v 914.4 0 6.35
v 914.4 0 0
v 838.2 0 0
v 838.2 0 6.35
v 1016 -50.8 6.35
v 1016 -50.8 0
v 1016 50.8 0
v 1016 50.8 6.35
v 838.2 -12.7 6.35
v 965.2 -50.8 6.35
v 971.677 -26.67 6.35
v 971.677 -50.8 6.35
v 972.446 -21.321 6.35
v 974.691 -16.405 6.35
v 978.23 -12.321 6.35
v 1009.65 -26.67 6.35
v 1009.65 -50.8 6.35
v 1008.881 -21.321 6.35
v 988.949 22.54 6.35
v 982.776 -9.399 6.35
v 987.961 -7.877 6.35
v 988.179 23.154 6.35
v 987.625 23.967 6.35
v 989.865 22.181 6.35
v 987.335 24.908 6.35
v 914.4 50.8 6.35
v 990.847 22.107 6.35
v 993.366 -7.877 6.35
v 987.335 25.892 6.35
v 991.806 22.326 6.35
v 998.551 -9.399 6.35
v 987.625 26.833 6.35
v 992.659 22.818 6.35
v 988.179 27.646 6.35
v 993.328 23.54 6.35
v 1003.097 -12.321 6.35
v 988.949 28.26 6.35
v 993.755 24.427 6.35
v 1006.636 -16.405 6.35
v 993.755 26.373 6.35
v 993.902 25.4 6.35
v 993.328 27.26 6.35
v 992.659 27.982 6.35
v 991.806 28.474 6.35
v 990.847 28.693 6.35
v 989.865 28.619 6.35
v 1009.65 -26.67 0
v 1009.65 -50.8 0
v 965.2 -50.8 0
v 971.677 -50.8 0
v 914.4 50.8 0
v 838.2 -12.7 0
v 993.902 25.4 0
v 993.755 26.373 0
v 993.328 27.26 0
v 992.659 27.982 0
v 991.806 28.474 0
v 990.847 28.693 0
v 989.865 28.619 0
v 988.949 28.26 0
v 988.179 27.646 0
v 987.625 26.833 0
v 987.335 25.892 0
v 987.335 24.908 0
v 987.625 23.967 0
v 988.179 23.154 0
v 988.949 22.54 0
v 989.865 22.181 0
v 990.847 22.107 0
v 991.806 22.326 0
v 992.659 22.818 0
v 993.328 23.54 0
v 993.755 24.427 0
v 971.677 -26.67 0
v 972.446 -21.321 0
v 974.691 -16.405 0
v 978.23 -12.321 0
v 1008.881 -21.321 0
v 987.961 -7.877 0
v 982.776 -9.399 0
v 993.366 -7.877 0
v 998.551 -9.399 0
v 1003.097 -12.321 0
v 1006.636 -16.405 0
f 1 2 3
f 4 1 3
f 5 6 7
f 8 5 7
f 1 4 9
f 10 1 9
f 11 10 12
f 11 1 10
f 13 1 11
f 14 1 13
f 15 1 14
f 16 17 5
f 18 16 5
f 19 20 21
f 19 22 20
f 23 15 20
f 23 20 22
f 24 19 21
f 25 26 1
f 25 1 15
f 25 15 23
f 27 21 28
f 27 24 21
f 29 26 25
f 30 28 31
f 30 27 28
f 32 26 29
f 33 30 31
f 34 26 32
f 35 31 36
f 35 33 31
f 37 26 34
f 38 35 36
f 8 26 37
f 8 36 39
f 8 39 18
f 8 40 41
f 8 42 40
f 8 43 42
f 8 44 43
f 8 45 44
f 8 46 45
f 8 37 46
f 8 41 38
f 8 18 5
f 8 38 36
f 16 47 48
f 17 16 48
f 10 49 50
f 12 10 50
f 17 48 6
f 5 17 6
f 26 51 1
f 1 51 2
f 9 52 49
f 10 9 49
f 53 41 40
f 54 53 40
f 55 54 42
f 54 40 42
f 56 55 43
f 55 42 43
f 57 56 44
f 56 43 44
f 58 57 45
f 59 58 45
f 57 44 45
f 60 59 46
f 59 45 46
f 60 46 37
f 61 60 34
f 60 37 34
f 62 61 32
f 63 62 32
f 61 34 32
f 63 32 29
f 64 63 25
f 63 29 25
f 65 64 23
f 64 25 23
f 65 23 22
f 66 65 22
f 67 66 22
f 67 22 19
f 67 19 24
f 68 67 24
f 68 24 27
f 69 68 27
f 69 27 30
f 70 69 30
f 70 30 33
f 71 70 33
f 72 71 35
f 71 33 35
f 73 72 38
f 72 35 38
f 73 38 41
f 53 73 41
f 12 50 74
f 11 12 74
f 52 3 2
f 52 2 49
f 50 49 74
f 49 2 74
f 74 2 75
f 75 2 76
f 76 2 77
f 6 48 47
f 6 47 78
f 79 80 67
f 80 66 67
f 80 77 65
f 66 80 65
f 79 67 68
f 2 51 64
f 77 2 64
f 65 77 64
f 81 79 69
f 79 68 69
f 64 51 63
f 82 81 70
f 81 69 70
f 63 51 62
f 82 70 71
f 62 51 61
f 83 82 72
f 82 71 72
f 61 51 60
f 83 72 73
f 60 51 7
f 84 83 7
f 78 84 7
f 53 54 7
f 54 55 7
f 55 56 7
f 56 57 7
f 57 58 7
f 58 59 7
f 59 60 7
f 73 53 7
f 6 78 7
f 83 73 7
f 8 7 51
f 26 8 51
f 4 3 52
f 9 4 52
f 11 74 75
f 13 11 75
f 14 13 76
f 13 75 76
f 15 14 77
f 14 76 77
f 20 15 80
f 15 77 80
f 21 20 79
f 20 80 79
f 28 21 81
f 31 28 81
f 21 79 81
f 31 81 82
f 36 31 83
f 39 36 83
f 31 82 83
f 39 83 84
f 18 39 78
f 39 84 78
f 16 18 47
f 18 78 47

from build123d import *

# Parameters (mm, degrees)
BOSS_EXTRUDE1_DEPTH = 6.35
SKETCH2_R           = 3.302
CUT_EXTRUDE3_DEPTH  = 6.35


with BuildPart() as part:
    # Sketch1 → Boss-Extrude1 (new body)
    with BuildSketch(Plane.XY):
        with BuildLine():
            Line((914.4, 0), (838.2, 0))
            Line((838.2, 0), (838.2, -12.7))
            Line((838.2, -12.7), (965.2, -50.8))
            Line((965.2, -50.8), (971.677, -50.8))
            Line((971.677, -50.8), (971.677, -26.67))
            ThreePointArc((971.677, -26.67), (990.6635, -7.6835), (1009.65, -26.67))
            Line((1009.65, -26.67), (1009.65, -50.8))
            Line((1009.65, -50.8), (1016, -50.8))
            Line((1016, -50.8), (1016, 50.8))
            Line((1016, 50.8), (965.2, 50.8))
            Line((965.2, 50.8), (914.4, 50.8))
            Line((914.4, 50.8), (914.4, 0))
        make_face()
    extrude(amount=BOSS_EXTRUDE1_DEPTH)

    # Sketch2 → Cut-Extrude3 (cut)
    with BuildSketch(Plane.XY.offset(6.35)):
        with Locations((990.6, 25.4)):
            Circle(SKETCH2_R)
    extrude(amount=-CUT_EXTRUDE3_DEPTH, mode=Mode.SUBTRACT)


solid = part.part
